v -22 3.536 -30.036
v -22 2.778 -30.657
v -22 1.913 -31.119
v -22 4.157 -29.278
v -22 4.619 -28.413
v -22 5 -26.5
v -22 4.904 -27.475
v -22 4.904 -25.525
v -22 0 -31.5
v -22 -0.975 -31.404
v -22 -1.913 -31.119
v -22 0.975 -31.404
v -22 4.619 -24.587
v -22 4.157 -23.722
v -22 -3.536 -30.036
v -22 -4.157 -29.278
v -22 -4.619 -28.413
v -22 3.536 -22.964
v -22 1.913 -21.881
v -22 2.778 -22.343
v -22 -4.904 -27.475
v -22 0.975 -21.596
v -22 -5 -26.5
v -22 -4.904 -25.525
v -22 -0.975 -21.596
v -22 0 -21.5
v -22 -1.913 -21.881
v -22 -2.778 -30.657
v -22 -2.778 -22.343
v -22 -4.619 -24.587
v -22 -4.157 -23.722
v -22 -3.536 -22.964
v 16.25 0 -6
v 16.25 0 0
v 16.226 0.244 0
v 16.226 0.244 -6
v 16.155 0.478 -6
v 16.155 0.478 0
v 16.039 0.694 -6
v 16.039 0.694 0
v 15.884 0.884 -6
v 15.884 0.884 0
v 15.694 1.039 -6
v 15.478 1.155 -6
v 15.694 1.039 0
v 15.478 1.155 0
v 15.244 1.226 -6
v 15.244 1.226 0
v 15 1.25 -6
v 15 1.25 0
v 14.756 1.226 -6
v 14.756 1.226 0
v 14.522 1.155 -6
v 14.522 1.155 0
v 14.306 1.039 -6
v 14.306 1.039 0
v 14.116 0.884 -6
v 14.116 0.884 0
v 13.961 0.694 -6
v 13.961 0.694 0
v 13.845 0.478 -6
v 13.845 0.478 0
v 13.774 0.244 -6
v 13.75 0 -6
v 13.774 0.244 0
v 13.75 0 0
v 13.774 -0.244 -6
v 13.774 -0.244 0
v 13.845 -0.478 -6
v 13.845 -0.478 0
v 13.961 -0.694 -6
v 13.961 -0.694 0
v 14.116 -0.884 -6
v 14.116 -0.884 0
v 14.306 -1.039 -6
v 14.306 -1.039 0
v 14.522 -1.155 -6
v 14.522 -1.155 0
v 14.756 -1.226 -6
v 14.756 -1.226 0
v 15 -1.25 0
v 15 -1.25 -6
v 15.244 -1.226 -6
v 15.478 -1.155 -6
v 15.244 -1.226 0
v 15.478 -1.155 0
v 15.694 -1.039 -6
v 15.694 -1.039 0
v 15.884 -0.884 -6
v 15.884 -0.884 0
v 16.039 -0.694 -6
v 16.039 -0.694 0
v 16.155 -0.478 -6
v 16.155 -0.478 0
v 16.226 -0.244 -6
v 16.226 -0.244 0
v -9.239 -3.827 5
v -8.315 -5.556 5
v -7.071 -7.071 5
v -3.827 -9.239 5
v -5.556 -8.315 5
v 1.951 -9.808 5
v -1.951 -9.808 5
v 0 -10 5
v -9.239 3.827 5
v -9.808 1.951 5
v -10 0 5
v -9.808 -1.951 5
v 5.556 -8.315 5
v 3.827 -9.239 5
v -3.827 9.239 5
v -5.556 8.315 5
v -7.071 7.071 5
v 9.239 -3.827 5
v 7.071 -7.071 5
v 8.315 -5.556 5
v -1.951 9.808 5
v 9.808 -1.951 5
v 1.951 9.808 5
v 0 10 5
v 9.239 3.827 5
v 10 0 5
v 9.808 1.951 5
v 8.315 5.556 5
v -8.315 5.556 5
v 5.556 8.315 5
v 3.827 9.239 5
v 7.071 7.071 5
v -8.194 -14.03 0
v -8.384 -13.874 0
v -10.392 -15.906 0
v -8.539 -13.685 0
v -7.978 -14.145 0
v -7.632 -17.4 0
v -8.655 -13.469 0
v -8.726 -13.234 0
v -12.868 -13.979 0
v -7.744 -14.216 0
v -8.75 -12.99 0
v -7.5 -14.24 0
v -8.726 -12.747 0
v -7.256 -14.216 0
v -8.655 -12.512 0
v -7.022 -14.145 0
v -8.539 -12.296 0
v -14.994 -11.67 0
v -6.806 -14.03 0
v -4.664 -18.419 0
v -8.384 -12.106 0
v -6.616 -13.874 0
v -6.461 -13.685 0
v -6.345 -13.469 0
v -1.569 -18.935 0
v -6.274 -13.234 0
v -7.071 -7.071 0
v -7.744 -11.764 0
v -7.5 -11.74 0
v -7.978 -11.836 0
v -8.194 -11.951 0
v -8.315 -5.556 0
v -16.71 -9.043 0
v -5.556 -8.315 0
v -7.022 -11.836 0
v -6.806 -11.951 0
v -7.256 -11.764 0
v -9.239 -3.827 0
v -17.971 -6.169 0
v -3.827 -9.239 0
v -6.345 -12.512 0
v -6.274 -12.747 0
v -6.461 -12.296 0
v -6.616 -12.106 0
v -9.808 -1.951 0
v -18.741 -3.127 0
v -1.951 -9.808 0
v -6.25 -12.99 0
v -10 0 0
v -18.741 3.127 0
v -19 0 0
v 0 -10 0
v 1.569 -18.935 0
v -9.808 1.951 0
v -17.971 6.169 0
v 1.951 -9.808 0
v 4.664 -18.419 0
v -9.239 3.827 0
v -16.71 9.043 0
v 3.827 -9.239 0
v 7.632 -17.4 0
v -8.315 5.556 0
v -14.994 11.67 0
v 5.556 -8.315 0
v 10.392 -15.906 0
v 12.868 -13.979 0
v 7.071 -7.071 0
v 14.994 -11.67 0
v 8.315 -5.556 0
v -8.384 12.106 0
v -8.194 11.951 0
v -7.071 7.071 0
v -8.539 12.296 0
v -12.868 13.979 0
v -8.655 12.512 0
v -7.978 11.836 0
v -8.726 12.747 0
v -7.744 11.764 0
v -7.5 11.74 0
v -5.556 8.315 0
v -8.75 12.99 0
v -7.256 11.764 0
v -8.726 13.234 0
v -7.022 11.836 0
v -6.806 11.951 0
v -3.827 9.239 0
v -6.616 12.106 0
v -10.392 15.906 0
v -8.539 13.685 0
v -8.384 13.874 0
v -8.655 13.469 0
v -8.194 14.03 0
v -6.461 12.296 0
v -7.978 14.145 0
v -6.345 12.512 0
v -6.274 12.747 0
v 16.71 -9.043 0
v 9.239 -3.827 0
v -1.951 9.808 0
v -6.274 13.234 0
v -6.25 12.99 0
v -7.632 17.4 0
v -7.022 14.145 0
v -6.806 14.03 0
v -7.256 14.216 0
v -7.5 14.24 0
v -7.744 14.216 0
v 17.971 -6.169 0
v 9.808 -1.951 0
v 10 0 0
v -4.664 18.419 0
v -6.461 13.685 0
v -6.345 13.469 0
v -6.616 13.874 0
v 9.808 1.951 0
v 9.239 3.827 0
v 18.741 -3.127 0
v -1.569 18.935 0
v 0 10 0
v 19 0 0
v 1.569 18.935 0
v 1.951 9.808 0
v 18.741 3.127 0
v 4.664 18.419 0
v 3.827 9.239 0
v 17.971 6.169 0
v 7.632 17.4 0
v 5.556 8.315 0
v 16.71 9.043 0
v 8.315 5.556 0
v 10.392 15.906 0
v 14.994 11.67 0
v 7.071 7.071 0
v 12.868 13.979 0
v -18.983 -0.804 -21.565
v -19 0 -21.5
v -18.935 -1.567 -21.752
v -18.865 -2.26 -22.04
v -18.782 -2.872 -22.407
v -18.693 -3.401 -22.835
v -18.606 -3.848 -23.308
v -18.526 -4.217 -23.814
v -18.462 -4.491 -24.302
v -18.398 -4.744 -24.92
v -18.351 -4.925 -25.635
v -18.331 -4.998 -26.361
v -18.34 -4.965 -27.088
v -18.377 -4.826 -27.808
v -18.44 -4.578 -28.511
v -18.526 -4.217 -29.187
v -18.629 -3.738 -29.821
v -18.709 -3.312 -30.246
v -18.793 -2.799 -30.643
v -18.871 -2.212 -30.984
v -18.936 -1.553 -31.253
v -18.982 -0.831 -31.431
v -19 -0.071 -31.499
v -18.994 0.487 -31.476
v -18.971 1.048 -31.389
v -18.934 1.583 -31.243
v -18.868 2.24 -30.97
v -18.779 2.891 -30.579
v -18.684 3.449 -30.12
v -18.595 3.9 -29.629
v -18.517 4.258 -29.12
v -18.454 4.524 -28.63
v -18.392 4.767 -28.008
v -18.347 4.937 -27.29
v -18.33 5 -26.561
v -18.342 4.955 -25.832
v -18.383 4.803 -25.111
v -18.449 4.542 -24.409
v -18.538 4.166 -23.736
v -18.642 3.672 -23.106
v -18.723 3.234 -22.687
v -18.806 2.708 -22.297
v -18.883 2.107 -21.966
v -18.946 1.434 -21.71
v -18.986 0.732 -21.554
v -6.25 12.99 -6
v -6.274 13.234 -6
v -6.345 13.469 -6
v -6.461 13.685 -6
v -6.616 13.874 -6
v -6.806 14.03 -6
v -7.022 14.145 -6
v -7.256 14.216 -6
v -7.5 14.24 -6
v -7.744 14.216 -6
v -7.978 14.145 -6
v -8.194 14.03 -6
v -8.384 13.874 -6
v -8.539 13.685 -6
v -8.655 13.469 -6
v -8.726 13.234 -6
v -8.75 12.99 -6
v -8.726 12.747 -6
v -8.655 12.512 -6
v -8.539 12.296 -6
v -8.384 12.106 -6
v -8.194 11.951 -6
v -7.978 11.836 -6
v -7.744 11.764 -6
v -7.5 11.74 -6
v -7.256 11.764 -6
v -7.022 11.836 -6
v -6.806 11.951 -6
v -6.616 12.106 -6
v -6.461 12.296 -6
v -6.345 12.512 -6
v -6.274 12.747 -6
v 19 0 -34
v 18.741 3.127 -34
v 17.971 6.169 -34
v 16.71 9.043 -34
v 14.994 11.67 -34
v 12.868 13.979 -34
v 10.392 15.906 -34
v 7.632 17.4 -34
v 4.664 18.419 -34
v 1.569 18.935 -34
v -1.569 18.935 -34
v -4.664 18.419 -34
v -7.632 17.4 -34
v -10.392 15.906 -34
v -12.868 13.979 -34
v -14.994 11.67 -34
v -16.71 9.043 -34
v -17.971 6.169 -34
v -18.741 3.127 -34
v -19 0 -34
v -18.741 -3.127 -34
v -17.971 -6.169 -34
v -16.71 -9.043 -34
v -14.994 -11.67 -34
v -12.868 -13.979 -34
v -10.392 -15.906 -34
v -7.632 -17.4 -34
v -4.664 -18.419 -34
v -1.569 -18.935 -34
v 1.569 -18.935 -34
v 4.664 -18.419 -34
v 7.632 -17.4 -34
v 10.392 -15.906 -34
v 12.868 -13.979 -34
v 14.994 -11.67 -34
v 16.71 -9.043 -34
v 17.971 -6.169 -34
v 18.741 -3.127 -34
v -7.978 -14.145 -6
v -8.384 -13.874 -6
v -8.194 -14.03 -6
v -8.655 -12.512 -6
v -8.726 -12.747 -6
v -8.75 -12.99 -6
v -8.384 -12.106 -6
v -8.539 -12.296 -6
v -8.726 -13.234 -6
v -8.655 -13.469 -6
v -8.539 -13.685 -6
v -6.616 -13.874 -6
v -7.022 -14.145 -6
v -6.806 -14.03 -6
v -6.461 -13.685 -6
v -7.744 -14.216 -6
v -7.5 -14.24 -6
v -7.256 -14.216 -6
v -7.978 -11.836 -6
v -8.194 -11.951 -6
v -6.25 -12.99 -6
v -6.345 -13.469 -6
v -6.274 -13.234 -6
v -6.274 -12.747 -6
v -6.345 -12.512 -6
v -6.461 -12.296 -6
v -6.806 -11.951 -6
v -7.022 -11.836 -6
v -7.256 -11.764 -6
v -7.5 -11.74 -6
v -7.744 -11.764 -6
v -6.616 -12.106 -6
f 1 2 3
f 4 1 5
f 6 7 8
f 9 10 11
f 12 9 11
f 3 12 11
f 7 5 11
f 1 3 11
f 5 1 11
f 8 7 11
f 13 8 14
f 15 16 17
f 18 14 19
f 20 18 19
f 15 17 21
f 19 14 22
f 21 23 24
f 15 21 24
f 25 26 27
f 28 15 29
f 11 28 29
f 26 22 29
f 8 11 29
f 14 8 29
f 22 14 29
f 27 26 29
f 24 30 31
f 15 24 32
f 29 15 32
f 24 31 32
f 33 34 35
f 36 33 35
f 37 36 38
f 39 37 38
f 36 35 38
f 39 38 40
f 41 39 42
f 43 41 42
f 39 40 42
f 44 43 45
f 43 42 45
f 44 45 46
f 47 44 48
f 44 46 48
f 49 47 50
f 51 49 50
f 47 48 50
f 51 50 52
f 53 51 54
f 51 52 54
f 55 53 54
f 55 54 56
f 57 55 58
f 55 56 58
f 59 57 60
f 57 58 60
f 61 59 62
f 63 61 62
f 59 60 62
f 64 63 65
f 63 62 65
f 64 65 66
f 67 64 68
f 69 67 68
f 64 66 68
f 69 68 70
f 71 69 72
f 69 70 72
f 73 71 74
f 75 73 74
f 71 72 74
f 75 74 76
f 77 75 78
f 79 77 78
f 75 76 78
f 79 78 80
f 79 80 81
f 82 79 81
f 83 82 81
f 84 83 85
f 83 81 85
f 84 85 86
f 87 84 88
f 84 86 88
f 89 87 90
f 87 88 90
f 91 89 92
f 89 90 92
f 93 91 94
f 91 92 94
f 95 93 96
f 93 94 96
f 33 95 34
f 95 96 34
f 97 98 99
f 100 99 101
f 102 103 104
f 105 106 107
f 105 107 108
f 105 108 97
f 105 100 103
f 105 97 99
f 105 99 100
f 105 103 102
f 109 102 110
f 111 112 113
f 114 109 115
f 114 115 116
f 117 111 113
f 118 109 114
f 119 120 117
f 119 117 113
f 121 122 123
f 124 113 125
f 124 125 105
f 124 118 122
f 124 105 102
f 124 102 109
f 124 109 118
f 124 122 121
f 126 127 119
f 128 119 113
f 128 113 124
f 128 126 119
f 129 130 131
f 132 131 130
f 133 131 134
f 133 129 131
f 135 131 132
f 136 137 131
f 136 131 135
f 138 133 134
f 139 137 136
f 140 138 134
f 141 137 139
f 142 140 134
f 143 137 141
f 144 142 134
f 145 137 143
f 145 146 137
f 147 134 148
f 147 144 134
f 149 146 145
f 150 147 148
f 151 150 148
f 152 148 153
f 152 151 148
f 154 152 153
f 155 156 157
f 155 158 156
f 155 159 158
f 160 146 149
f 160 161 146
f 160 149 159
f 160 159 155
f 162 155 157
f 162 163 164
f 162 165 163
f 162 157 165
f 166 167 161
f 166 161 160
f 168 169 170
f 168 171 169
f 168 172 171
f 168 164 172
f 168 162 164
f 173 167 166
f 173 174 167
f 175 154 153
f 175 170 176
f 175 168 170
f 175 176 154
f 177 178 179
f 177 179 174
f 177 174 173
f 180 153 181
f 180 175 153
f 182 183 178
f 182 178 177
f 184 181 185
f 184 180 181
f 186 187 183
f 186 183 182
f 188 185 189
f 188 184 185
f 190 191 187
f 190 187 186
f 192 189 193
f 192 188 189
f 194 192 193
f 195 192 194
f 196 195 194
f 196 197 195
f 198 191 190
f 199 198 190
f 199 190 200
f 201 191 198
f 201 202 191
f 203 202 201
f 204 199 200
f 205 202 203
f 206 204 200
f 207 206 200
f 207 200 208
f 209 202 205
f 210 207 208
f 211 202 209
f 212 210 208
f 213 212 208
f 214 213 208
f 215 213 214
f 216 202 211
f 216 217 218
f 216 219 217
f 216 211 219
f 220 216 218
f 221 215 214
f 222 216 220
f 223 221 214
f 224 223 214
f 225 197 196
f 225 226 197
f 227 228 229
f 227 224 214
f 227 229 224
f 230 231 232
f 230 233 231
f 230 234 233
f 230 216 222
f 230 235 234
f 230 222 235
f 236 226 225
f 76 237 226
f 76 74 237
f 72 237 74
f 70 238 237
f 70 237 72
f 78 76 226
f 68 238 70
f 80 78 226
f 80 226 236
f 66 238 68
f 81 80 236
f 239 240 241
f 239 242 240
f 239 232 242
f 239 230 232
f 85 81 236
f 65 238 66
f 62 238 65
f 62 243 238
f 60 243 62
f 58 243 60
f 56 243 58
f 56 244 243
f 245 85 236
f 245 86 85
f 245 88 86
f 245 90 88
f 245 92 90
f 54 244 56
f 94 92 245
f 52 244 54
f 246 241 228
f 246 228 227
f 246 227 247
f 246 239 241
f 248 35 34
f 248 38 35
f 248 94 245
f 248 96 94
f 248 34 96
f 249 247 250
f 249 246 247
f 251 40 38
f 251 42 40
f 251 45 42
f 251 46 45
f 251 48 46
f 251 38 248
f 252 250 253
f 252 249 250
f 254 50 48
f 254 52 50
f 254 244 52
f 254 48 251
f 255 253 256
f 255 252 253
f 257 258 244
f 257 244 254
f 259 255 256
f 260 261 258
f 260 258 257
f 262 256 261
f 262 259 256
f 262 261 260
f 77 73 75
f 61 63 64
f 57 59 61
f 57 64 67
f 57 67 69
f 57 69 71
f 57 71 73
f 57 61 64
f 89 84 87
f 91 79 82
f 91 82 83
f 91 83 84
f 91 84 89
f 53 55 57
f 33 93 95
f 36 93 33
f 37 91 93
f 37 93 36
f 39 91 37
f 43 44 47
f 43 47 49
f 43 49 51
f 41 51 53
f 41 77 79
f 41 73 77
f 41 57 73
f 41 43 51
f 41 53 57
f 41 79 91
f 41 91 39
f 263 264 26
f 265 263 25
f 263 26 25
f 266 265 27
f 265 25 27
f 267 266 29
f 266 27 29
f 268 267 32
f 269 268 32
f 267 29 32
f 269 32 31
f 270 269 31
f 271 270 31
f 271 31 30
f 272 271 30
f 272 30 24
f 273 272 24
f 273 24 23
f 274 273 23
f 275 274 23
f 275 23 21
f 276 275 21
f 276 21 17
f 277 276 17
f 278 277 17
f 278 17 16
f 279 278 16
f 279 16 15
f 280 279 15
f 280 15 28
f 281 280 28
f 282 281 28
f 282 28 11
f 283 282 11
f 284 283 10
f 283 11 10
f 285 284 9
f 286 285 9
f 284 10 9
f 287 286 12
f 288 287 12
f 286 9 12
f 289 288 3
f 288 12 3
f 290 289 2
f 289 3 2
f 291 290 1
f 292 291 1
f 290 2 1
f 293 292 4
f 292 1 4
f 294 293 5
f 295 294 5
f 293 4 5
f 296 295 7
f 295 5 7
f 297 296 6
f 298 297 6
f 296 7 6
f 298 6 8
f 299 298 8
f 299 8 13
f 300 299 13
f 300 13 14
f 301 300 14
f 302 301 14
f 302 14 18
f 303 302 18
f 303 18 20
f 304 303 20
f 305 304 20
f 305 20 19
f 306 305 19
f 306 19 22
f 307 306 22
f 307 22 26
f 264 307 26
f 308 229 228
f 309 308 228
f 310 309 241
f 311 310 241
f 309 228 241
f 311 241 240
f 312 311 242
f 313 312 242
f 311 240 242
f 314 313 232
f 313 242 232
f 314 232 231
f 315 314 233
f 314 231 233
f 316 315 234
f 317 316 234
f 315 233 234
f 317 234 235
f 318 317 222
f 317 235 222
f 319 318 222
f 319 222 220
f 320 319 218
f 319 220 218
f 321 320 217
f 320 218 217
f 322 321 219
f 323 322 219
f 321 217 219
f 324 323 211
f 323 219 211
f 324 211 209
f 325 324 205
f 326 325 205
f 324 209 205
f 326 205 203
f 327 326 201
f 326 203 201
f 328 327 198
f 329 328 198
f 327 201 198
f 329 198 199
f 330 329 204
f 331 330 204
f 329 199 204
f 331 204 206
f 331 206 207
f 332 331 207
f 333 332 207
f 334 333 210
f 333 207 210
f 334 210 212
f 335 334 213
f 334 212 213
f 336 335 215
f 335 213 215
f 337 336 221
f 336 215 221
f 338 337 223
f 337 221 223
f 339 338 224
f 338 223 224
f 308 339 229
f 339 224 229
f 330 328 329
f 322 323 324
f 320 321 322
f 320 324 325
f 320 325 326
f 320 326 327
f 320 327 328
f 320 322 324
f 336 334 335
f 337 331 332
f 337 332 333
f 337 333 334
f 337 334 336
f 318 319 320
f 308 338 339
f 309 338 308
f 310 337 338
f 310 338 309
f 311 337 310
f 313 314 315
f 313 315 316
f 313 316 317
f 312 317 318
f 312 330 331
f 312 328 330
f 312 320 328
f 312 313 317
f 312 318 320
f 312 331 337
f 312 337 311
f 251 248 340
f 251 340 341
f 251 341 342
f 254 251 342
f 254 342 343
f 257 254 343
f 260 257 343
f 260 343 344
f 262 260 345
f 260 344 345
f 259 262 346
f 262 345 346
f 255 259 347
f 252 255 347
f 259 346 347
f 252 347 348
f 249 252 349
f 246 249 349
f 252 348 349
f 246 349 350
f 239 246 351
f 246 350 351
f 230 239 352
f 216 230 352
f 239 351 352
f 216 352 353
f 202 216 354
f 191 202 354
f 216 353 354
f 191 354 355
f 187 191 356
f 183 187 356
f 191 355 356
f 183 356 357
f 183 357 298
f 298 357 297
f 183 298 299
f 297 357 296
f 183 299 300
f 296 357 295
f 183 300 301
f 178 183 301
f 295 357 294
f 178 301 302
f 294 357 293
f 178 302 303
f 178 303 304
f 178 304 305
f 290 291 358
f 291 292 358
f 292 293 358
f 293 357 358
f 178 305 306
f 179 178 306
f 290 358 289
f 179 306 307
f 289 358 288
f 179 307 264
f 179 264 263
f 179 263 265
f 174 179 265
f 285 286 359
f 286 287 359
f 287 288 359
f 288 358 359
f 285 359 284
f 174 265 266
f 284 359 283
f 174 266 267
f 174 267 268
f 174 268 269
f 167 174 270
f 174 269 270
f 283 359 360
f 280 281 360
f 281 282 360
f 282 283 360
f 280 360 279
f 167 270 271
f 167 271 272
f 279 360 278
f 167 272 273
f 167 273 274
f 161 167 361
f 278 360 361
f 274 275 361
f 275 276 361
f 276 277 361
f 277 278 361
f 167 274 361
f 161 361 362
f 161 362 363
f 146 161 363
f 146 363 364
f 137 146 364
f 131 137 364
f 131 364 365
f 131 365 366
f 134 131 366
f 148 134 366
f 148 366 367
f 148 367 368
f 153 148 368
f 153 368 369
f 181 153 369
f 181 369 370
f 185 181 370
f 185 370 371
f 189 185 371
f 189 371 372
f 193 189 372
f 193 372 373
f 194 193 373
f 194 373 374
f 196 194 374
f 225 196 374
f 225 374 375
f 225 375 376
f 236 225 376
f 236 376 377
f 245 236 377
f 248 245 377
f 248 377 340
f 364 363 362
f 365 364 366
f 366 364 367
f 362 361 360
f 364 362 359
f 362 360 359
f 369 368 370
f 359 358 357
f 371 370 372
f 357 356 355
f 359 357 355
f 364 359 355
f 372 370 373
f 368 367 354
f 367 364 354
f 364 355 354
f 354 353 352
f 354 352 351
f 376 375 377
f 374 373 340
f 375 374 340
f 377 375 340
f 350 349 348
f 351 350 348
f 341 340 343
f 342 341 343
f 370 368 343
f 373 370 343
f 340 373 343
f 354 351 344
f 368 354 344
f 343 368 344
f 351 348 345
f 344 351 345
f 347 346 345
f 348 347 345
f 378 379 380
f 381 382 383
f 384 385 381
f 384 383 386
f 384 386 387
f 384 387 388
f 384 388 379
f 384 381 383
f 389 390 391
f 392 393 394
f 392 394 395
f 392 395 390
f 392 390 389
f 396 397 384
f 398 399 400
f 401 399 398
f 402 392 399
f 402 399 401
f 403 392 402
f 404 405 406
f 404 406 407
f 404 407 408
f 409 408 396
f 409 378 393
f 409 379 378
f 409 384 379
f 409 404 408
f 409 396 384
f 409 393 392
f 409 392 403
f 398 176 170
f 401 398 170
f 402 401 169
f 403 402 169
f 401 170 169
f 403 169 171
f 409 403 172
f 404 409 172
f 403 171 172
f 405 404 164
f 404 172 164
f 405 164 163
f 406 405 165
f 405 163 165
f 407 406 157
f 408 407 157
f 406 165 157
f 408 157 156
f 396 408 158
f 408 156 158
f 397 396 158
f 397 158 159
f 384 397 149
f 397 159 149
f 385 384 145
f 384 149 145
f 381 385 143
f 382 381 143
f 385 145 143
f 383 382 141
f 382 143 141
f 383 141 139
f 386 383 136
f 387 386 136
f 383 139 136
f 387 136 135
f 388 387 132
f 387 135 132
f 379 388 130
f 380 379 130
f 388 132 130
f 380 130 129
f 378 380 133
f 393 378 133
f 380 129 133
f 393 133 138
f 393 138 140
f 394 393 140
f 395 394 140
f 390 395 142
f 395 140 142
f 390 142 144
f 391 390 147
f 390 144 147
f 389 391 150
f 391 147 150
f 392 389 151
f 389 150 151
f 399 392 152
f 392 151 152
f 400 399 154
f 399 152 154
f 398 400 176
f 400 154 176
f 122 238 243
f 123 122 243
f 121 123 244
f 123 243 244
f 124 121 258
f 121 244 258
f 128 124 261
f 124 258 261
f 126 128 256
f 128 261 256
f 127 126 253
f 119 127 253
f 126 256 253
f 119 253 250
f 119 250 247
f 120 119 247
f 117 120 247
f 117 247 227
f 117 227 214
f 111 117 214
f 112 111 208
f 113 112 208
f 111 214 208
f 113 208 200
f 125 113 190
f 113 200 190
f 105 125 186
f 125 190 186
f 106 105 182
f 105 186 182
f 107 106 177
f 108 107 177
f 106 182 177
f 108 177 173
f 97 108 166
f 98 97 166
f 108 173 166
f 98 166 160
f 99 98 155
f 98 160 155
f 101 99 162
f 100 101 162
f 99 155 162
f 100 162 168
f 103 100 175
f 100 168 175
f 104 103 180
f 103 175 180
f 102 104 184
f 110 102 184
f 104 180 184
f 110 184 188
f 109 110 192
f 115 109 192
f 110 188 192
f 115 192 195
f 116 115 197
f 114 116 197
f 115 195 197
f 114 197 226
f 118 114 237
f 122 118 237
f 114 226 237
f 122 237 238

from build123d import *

# Parameters (mm, degrees)
SKETCH_1_R                              = 19
HOUSING_OD38_L34_FROM_DRAWING_DEPTH     = 34
SKETCH_2_R                              = 10
PILOT_OD20_L5_DEPTH                     = 5
SKETCH_3_R                              = 5
SIDE_CABLE_GLAND_ENVELOPE_EST_DEPTH     = 5
SKETCH_4_R                              = 1.25
FRONT_3XM3_PCD30_DEPTH6_REFERENCE_DEPTH = 6


with BuildPart() as part:
    # 草图1 → Housing_OD38_L34_from_drawing (new body)
    with BuildSketch(Plane.XY.offset(-34)):
        Circle(SKETCH_1_R)
    extrude(amount=HOUSING_OD38_L34_FROM_DRAWING_DEPTH)

    # 草图2 → Pilot_OD20_L5 (add)
    with BuildSketch(Plane.XY):
        Circle(SKETCH_2_R)
    extrude(amount=PILOT_OD20_L5_DEPTH)

    # 草图3 → Side_cable_gland_ENVELOPE_EST (add)
    with BuildSketch(Plane(origin=(-22, 0, 0), x_dir=(0, 0, -1), z_dir=(1, 0, 0))):
        with Locations(Location((26.5, 0, 0), (0, 0, 180))):
            Circle(SKETCH_3_R)
    extrude(amount=SIDE_CABLE_GLAND_ENVELOPE_EST_DEPTH)

    # 草图4 → Front_3xM3_PCD30_depth6_reference (cut)
    with BuildSketch(Plane.XY):
        with Locations((15, 0)):
            Circle(SKETCH_4_R)
        with Locations((-7.5, 12.990381057)):
            Circle(SKETCH_4_R)
        with Locations((-7.5, -12.990381057)):
            Circle(SKETCH_4_R)
    extrude(amount=-FRONT_3XM3_PCD30_DEPTH6_REFERENCE_DEPTH, mode=Mode.SUBTRACT)


solid = part.part
